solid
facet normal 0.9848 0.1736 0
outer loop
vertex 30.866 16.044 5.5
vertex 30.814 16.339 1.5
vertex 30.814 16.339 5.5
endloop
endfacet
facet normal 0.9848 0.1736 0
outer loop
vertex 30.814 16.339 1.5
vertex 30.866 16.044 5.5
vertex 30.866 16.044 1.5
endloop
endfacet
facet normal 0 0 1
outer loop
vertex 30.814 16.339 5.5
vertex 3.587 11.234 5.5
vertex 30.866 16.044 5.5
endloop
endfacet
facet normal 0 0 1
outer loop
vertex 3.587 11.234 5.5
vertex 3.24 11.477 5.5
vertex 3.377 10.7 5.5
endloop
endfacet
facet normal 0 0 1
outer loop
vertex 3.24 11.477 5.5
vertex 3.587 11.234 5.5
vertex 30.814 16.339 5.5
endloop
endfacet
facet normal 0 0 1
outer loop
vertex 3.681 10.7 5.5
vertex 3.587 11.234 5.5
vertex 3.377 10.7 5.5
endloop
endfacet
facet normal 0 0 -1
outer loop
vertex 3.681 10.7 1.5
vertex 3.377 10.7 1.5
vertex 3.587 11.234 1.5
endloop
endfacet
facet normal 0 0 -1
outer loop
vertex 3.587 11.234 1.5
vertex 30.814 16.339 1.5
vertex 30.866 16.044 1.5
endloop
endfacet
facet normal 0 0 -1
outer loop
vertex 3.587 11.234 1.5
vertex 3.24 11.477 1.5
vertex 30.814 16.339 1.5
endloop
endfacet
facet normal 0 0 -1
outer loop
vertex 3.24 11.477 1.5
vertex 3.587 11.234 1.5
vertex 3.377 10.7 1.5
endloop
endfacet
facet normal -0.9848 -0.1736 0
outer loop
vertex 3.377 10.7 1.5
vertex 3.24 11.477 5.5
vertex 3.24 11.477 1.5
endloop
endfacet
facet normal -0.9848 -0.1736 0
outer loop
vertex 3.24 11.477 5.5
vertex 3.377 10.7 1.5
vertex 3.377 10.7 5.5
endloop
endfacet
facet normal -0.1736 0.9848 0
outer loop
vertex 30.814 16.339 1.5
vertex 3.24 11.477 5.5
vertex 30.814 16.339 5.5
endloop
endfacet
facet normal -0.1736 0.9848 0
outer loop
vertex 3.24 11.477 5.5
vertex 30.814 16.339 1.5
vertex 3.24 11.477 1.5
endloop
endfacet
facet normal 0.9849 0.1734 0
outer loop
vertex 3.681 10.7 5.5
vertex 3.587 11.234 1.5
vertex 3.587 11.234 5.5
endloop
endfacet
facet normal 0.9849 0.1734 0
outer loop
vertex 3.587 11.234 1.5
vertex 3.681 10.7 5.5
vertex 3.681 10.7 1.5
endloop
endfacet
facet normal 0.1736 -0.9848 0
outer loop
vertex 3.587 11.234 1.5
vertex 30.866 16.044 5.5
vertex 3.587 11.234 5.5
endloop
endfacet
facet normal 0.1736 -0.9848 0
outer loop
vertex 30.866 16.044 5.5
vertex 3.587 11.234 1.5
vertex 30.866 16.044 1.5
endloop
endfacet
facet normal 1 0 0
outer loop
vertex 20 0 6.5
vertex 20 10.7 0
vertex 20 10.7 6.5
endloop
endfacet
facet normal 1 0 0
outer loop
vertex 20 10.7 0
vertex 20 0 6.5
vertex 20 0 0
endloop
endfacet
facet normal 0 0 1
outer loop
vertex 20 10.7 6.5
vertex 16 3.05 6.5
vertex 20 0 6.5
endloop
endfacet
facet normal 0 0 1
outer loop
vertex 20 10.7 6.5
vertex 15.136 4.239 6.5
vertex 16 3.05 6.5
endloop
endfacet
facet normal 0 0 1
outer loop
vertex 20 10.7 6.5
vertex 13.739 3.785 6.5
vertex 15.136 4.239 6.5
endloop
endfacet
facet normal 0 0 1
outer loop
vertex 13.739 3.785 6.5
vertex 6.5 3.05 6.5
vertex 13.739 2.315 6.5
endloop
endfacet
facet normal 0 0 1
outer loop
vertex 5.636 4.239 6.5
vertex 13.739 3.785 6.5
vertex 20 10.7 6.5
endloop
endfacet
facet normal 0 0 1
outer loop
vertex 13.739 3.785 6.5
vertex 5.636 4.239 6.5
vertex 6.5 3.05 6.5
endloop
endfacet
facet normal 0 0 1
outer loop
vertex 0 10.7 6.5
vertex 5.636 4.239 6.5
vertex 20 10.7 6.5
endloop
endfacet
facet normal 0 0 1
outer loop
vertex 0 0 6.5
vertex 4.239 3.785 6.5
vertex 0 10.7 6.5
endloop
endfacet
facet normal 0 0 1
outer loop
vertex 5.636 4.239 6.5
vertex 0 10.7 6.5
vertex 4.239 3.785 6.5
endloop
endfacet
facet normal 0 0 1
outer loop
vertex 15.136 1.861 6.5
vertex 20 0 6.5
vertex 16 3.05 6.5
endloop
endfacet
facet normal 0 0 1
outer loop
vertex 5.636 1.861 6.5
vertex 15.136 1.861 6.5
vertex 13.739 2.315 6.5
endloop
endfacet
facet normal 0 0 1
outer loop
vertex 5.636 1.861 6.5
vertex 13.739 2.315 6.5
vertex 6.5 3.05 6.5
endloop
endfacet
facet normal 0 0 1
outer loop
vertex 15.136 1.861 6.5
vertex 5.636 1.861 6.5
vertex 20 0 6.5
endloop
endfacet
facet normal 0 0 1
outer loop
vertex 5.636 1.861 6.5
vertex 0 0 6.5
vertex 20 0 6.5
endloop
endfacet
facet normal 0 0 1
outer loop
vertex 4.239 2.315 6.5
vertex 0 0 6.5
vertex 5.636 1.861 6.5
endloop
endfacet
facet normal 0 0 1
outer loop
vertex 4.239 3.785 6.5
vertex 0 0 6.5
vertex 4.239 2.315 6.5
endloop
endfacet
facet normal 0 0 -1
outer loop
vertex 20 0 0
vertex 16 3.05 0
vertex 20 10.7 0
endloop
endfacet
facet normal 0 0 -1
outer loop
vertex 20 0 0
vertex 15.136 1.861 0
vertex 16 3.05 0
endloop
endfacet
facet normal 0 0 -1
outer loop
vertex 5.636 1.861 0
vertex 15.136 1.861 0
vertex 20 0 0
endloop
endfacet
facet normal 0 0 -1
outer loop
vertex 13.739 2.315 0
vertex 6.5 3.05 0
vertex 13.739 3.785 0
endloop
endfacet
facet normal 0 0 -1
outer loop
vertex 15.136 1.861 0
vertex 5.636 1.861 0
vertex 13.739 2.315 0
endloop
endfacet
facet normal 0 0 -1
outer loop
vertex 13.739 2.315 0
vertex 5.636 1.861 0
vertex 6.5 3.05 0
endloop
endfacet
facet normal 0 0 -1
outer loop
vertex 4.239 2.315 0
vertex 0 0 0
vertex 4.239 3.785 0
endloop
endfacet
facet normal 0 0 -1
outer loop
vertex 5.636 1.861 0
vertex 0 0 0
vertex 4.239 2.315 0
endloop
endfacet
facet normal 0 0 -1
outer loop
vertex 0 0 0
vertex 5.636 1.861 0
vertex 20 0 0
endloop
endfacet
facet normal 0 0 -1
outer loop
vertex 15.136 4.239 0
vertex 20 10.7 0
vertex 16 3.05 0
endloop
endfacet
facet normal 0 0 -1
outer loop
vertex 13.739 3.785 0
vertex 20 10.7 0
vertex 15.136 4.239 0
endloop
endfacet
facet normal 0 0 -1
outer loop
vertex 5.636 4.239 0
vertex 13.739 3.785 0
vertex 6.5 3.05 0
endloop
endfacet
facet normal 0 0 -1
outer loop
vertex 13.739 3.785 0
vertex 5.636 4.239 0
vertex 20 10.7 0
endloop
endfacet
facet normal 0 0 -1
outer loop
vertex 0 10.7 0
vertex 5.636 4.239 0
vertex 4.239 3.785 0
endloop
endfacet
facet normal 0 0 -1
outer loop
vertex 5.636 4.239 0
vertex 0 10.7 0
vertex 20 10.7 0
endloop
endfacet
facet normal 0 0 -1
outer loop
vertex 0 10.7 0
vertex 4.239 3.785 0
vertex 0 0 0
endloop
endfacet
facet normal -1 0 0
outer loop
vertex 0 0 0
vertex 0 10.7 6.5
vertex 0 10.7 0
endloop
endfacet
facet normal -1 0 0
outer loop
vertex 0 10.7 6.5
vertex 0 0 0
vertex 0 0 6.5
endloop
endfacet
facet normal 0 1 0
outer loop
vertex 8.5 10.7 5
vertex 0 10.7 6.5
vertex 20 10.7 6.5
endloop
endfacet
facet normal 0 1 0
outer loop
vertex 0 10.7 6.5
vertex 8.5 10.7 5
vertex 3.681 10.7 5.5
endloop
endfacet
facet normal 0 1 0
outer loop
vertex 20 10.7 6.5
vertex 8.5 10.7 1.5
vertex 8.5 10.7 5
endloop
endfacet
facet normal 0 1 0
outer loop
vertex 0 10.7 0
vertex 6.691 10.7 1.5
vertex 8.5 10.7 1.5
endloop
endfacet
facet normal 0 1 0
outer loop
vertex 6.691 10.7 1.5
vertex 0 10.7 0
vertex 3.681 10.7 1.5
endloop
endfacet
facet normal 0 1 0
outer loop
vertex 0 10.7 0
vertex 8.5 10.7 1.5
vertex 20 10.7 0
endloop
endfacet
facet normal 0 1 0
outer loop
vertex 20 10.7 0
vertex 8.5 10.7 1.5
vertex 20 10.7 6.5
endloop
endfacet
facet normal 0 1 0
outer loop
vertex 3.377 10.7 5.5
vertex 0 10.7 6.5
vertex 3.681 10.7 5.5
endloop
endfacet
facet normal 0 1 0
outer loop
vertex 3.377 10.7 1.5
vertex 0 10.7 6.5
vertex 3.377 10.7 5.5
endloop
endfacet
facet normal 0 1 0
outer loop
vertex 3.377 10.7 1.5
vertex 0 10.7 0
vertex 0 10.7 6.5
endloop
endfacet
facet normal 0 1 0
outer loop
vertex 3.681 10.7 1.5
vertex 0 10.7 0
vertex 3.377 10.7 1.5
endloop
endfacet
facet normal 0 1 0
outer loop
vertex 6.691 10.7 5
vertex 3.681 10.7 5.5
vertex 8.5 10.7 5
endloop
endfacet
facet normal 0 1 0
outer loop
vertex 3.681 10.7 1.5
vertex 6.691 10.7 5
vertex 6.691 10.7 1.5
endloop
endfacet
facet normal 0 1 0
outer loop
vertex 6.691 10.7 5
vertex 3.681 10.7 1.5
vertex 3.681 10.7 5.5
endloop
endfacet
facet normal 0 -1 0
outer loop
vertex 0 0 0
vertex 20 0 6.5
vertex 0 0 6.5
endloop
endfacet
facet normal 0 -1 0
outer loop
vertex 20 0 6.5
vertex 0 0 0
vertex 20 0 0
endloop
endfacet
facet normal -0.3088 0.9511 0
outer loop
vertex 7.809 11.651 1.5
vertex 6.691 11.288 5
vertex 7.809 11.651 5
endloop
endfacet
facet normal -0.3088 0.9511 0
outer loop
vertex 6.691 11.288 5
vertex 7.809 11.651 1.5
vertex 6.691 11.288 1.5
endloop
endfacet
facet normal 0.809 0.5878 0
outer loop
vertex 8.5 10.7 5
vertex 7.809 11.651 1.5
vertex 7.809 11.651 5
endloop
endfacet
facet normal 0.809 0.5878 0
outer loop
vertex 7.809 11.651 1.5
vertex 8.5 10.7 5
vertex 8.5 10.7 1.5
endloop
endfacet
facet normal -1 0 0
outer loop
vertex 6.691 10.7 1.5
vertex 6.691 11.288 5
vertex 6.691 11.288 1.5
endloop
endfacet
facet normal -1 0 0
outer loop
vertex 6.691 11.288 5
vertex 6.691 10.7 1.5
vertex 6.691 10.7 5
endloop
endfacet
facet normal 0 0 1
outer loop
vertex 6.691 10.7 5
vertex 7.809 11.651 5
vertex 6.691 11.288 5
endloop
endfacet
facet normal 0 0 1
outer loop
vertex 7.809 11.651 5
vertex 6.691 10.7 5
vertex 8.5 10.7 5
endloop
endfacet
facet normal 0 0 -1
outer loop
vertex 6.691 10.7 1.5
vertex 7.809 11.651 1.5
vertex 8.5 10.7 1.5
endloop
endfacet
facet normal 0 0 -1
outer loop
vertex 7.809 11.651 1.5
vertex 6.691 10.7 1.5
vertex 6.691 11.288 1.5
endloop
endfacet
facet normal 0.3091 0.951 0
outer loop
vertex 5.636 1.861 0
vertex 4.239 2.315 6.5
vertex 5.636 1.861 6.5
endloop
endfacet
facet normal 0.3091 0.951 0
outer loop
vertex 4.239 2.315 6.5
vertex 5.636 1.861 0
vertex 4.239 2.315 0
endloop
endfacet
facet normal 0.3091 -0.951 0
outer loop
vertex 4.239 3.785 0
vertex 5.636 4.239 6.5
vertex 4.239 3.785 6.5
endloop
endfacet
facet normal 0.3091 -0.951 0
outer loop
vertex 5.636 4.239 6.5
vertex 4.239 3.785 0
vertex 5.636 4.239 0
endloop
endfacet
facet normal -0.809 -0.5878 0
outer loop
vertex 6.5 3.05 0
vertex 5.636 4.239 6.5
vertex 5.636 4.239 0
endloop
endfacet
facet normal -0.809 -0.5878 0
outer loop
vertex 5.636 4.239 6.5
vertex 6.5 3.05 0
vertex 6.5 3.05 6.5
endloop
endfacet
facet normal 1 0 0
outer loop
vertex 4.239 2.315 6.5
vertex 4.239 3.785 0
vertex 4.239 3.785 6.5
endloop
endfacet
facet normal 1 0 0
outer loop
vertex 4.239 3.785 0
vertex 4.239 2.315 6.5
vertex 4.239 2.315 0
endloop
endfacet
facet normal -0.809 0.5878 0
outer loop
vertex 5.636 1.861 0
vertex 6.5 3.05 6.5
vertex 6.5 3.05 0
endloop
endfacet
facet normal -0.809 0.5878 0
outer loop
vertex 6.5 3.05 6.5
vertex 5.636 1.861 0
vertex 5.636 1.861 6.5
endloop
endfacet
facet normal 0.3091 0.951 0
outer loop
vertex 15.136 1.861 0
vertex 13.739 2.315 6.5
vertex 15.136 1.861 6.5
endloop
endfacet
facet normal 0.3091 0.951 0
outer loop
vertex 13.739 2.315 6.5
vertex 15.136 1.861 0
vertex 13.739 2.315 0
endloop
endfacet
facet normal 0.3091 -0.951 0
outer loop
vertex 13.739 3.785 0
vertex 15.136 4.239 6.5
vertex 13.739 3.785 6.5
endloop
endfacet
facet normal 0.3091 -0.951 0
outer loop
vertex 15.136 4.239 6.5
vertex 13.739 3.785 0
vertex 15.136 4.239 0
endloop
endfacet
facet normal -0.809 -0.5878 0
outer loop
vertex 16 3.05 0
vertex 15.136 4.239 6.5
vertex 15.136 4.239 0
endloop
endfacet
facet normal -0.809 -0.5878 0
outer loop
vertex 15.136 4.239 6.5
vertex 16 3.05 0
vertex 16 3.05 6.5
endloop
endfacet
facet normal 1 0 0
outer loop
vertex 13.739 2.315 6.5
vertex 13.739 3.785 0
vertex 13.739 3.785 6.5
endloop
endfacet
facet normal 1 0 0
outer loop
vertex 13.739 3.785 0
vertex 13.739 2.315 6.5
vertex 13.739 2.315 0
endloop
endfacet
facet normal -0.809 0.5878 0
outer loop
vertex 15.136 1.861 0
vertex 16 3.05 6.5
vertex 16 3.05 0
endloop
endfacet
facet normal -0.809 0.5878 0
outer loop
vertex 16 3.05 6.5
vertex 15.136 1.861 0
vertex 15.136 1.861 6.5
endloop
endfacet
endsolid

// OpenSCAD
module switchArm(){
    color([0.5, 0.5, 0.5])
        difference(){
            cube([28, 1.5, 4]);
            translate([0.3, -1, -1])
            cube([28, 2.2, 6]);
        }
}

module limitSwitchBody(){
    color([0.1, 0.1, 0.1])
    cube([20, 10.7, 6.5]);
    translate([7.5, 10.7, 1.5])
    color([1, 0, 0])
    cylinder(3.5,1,1);
    translate([3.5, 10, 1.5])
        rotate([0,0,10])
        switchArm();
}

module limitSwitchHoles(r, h){
    translate([4+2.5/2,1.8+2.5/2,0])
        cylinder(h,r,r);
    translate([13.5+2.5/2,1.8+2.5/2,0])
        cylinder(h,r,r);
}

module limitSwitch(){
    difference(){
        limitSwitchBody();
        translate([0, 0, -1])
            limitSwitchHoles(1.25, 10);
    }
}

limitSwitch();
